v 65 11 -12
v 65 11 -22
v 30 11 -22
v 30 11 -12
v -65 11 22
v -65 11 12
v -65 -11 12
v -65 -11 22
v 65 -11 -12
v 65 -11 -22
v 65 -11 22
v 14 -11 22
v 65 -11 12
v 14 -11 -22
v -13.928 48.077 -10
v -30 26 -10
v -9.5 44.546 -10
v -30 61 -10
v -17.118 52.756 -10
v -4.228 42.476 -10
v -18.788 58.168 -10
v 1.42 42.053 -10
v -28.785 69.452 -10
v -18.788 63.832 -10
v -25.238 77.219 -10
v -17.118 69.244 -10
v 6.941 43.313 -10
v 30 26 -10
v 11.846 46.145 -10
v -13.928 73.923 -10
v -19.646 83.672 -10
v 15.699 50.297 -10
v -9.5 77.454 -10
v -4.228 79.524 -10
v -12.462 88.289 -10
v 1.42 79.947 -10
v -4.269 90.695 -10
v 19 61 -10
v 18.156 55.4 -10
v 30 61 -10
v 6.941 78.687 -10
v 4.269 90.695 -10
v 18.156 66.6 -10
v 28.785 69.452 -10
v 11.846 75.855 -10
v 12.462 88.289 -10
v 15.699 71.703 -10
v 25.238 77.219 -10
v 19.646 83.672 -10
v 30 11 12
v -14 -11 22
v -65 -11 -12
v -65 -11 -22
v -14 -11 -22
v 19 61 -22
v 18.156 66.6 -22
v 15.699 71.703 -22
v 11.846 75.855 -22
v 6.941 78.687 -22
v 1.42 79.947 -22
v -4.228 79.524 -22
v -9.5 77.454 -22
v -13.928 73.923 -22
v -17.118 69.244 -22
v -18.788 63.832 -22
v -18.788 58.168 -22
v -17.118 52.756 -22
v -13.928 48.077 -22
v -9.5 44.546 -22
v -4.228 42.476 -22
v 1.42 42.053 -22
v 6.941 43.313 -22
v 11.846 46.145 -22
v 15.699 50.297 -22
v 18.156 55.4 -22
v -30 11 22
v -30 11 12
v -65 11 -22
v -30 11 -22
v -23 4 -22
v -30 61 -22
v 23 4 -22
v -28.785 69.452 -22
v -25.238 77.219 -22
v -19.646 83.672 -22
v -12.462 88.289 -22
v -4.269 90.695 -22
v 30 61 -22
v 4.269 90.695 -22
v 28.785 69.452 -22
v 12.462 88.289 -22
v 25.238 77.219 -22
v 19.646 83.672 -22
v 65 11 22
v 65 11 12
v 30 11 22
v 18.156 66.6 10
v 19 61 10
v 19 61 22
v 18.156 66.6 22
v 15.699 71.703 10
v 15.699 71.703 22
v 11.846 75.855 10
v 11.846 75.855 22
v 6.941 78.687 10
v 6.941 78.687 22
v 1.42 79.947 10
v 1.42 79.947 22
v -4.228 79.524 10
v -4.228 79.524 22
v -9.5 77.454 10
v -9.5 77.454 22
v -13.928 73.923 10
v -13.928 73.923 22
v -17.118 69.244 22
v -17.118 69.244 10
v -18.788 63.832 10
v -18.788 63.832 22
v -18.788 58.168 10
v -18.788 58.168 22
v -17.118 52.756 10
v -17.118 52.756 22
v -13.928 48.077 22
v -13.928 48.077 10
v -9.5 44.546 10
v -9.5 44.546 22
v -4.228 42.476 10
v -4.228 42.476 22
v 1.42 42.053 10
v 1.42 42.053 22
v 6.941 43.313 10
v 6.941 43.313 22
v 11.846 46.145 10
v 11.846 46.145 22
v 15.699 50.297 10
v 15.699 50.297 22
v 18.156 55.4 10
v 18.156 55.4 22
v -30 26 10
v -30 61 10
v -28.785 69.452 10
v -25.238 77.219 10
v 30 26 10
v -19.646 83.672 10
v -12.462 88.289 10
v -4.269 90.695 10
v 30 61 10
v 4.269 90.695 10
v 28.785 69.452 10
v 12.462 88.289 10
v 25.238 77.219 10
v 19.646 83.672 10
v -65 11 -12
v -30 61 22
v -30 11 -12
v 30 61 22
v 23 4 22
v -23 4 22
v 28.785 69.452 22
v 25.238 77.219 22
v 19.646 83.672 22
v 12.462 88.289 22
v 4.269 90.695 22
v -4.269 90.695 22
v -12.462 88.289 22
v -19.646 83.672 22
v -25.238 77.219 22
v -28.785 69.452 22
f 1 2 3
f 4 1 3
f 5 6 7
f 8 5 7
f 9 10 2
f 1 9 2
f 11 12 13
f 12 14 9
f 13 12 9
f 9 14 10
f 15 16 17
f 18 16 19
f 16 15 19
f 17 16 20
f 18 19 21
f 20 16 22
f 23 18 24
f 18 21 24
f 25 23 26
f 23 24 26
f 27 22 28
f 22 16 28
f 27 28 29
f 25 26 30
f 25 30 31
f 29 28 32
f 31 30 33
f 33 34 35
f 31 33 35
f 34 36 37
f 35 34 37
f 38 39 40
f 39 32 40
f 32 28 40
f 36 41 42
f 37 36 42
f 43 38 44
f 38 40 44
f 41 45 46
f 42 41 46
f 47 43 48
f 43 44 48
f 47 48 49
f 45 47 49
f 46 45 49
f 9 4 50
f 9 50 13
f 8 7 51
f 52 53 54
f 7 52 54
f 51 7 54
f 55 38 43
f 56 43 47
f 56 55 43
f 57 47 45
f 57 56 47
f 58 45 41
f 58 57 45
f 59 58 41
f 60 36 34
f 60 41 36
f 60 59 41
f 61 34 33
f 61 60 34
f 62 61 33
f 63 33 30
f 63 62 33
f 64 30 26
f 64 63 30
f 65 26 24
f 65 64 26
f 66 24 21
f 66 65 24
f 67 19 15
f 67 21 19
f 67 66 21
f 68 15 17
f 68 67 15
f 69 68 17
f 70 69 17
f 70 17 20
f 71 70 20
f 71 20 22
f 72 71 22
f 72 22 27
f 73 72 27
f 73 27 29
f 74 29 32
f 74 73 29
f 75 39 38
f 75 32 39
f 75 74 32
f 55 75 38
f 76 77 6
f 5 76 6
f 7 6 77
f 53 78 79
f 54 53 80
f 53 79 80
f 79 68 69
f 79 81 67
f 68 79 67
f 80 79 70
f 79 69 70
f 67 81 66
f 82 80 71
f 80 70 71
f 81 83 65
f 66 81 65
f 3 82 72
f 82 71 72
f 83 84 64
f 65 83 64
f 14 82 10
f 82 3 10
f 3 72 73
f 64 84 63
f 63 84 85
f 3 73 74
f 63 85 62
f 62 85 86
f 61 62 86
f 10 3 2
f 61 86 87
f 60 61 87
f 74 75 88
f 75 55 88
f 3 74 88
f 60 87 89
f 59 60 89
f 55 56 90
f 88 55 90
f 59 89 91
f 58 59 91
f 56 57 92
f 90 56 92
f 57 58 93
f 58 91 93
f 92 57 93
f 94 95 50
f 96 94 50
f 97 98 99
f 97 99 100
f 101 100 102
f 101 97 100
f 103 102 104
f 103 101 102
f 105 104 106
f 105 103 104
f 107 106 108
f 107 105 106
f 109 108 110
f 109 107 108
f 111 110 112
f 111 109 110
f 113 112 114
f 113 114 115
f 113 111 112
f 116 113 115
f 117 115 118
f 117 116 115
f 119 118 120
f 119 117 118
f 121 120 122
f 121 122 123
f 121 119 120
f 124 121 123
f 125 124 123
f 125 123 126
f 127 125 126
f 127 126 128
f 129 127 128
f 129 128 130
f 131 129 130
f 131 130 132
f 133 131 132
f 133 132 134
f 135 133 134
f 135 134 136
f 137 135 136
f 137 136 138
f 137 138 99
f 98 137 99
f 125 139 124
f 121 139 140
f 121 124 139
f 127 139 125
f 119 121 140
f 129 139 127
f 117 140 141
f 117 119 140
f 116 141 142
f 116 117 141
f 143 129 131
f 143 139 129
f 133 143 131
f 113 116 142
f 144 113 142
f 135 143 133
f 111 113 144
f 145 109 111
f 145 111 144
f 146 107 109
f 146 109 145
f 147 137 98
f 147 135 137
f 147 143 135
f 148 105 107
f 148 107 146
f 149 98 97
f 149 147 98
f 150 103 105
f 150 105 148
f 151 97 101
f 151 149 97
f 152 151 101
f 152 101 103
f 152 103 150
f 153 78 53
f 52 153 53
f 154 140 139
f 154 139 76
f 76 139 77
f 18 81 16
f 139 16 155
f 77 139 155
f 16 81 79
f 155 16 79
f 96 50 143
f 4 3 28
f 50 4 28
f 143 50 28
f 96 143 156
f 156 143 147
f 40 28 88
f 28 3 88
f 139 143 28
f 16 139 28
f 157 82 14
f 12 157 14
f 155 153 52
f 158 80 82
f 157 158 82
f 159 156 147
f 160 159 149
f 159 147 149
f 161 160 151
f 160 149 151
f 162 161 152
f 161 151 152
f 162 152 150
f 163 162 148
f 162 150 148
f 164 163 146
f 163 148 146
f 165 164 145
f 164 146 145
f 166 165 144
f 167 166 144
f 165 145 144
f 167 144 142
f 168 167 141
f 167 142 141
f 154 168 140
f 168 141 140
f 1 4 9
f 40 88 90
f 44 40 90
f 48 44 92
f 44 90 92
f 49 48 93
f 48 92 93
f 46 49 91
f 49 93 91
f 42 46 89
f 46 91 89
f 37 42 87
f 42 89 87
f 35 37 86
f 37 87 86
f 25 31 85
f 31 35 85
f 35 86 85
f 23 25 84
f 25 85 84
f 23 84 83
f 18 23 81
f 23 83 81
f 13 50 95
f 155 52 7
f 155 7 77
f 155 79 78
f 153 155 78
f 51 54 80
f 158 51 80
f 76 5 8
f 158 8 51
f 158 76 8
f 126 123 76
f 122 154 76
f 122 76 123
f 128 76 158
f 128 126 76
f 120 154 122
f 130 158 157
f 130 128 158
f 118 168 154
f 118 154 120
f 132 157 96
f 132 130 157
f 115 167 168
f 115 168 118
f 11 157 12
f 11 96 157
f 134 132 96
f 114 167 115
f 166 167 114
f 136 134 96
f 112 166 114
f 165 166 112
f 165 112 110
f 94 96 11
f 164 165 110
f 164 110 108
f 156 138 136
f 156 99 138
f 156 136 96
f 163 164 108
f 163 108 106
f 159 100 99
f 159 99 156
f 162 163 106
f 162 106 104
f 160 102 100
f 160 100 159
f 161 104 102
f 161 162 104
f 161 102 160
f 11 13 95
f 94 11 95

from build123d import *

# Parameters (mm, degrees)
BOSS_EXTRUDE1_DEPTH      = 22
BOSS_EXTRUDE1_DEPTH_BACK = 22
CUT_EXTRUDE1_DEPTH       = 12
CUT_EXTRUDE1_DEPTH_BACK  = 12
BOSS_EXTRUDE2_DEPTH      = 22
BOSS_EXTRUDE2_DEPTH_BACK = 22
SKETCH1_4_R              = 19
SKETCH2_W                = 20
SKETCH2_H                = 71.319649742
CUT_EXTRUDE2_DEPTH       = 134.379158792


with BuildPart() as part:
    # Sketch1 → Boss-Extrude1 (new, two sides: drawn at the far end of the back side and taken through both)
    with BuildSketch(Plane.XY.offset(-BOSS_EXTRUDE1_DEPTH_BACK)):
        Polygon((-65, 11), (-65, -11), (-14, -11), (-23, 4), (23, 4), (14, -11), (65, -11), (65, 11), align=None)
    extrude(amount=BOSS_EXTRUDE1_DEPTH + BOSS_EXTRUDE1_DEPTH_BACK)

    # Sketch1<3> → Cut-Extrude1 (cut, two sides: drawn at the far end of the back side and taken through both)
    with BuildSketch(Plane.XY.offset(-CUT_EXTRUDE1_DEPTH_BACK)):
        Polygon((-65, 11), (-65, -11), (-30, 11), align=None)
        Polygon((65, 11), (30, 11), (65, -11), align=None)
    extrude(amount=CUT_EXTRUDE1_DEPTH + CUT_EXTRUDE1_DEPTH_BACK, mode=Mode.SUBTRACT)

    # Sketch1<4> → Boss-Extrude2 (add, two sides: drawn at the far end of the back side and taken through both)
    with BuildSketch(Plane.XY.offset(-BOSS_EXTRUDE2_DEPTH_BACK)):
        with BuildLine():
            Line((-30, 61), (-30, 11))
            Line((-30, 11), (30, 11))
            Line((30, 11), (30, 61))
            ThreePointArc((30, 61), (0, 91), (-30, 61))
        make_face()
        with Locations((0, 61)):
            Circle(SKETCH1_4_R, mode=Mode.SUBTRACT)
    extrude(amount=BOSS_EXTRUDE2_DEPTH + BOSS_EXTRUDE2_DEPTH_BACK)

    # Sketch2 → Cut-Extrude2 (cut, through all)
    with BuildSketch(Plane(origin=(30, 0, 0), x_dir=(0, 0, -1), z_dir=(1, 0, 0))):
        with Locations((0, 61.659824871)):
            Rectangle(SKETCH2_W, SKETCH2_H)
    extrude(amount=-CUT_EXTRUDE2_DEPTH, mode=Mode.SUBTRACT)


solid = part.part
